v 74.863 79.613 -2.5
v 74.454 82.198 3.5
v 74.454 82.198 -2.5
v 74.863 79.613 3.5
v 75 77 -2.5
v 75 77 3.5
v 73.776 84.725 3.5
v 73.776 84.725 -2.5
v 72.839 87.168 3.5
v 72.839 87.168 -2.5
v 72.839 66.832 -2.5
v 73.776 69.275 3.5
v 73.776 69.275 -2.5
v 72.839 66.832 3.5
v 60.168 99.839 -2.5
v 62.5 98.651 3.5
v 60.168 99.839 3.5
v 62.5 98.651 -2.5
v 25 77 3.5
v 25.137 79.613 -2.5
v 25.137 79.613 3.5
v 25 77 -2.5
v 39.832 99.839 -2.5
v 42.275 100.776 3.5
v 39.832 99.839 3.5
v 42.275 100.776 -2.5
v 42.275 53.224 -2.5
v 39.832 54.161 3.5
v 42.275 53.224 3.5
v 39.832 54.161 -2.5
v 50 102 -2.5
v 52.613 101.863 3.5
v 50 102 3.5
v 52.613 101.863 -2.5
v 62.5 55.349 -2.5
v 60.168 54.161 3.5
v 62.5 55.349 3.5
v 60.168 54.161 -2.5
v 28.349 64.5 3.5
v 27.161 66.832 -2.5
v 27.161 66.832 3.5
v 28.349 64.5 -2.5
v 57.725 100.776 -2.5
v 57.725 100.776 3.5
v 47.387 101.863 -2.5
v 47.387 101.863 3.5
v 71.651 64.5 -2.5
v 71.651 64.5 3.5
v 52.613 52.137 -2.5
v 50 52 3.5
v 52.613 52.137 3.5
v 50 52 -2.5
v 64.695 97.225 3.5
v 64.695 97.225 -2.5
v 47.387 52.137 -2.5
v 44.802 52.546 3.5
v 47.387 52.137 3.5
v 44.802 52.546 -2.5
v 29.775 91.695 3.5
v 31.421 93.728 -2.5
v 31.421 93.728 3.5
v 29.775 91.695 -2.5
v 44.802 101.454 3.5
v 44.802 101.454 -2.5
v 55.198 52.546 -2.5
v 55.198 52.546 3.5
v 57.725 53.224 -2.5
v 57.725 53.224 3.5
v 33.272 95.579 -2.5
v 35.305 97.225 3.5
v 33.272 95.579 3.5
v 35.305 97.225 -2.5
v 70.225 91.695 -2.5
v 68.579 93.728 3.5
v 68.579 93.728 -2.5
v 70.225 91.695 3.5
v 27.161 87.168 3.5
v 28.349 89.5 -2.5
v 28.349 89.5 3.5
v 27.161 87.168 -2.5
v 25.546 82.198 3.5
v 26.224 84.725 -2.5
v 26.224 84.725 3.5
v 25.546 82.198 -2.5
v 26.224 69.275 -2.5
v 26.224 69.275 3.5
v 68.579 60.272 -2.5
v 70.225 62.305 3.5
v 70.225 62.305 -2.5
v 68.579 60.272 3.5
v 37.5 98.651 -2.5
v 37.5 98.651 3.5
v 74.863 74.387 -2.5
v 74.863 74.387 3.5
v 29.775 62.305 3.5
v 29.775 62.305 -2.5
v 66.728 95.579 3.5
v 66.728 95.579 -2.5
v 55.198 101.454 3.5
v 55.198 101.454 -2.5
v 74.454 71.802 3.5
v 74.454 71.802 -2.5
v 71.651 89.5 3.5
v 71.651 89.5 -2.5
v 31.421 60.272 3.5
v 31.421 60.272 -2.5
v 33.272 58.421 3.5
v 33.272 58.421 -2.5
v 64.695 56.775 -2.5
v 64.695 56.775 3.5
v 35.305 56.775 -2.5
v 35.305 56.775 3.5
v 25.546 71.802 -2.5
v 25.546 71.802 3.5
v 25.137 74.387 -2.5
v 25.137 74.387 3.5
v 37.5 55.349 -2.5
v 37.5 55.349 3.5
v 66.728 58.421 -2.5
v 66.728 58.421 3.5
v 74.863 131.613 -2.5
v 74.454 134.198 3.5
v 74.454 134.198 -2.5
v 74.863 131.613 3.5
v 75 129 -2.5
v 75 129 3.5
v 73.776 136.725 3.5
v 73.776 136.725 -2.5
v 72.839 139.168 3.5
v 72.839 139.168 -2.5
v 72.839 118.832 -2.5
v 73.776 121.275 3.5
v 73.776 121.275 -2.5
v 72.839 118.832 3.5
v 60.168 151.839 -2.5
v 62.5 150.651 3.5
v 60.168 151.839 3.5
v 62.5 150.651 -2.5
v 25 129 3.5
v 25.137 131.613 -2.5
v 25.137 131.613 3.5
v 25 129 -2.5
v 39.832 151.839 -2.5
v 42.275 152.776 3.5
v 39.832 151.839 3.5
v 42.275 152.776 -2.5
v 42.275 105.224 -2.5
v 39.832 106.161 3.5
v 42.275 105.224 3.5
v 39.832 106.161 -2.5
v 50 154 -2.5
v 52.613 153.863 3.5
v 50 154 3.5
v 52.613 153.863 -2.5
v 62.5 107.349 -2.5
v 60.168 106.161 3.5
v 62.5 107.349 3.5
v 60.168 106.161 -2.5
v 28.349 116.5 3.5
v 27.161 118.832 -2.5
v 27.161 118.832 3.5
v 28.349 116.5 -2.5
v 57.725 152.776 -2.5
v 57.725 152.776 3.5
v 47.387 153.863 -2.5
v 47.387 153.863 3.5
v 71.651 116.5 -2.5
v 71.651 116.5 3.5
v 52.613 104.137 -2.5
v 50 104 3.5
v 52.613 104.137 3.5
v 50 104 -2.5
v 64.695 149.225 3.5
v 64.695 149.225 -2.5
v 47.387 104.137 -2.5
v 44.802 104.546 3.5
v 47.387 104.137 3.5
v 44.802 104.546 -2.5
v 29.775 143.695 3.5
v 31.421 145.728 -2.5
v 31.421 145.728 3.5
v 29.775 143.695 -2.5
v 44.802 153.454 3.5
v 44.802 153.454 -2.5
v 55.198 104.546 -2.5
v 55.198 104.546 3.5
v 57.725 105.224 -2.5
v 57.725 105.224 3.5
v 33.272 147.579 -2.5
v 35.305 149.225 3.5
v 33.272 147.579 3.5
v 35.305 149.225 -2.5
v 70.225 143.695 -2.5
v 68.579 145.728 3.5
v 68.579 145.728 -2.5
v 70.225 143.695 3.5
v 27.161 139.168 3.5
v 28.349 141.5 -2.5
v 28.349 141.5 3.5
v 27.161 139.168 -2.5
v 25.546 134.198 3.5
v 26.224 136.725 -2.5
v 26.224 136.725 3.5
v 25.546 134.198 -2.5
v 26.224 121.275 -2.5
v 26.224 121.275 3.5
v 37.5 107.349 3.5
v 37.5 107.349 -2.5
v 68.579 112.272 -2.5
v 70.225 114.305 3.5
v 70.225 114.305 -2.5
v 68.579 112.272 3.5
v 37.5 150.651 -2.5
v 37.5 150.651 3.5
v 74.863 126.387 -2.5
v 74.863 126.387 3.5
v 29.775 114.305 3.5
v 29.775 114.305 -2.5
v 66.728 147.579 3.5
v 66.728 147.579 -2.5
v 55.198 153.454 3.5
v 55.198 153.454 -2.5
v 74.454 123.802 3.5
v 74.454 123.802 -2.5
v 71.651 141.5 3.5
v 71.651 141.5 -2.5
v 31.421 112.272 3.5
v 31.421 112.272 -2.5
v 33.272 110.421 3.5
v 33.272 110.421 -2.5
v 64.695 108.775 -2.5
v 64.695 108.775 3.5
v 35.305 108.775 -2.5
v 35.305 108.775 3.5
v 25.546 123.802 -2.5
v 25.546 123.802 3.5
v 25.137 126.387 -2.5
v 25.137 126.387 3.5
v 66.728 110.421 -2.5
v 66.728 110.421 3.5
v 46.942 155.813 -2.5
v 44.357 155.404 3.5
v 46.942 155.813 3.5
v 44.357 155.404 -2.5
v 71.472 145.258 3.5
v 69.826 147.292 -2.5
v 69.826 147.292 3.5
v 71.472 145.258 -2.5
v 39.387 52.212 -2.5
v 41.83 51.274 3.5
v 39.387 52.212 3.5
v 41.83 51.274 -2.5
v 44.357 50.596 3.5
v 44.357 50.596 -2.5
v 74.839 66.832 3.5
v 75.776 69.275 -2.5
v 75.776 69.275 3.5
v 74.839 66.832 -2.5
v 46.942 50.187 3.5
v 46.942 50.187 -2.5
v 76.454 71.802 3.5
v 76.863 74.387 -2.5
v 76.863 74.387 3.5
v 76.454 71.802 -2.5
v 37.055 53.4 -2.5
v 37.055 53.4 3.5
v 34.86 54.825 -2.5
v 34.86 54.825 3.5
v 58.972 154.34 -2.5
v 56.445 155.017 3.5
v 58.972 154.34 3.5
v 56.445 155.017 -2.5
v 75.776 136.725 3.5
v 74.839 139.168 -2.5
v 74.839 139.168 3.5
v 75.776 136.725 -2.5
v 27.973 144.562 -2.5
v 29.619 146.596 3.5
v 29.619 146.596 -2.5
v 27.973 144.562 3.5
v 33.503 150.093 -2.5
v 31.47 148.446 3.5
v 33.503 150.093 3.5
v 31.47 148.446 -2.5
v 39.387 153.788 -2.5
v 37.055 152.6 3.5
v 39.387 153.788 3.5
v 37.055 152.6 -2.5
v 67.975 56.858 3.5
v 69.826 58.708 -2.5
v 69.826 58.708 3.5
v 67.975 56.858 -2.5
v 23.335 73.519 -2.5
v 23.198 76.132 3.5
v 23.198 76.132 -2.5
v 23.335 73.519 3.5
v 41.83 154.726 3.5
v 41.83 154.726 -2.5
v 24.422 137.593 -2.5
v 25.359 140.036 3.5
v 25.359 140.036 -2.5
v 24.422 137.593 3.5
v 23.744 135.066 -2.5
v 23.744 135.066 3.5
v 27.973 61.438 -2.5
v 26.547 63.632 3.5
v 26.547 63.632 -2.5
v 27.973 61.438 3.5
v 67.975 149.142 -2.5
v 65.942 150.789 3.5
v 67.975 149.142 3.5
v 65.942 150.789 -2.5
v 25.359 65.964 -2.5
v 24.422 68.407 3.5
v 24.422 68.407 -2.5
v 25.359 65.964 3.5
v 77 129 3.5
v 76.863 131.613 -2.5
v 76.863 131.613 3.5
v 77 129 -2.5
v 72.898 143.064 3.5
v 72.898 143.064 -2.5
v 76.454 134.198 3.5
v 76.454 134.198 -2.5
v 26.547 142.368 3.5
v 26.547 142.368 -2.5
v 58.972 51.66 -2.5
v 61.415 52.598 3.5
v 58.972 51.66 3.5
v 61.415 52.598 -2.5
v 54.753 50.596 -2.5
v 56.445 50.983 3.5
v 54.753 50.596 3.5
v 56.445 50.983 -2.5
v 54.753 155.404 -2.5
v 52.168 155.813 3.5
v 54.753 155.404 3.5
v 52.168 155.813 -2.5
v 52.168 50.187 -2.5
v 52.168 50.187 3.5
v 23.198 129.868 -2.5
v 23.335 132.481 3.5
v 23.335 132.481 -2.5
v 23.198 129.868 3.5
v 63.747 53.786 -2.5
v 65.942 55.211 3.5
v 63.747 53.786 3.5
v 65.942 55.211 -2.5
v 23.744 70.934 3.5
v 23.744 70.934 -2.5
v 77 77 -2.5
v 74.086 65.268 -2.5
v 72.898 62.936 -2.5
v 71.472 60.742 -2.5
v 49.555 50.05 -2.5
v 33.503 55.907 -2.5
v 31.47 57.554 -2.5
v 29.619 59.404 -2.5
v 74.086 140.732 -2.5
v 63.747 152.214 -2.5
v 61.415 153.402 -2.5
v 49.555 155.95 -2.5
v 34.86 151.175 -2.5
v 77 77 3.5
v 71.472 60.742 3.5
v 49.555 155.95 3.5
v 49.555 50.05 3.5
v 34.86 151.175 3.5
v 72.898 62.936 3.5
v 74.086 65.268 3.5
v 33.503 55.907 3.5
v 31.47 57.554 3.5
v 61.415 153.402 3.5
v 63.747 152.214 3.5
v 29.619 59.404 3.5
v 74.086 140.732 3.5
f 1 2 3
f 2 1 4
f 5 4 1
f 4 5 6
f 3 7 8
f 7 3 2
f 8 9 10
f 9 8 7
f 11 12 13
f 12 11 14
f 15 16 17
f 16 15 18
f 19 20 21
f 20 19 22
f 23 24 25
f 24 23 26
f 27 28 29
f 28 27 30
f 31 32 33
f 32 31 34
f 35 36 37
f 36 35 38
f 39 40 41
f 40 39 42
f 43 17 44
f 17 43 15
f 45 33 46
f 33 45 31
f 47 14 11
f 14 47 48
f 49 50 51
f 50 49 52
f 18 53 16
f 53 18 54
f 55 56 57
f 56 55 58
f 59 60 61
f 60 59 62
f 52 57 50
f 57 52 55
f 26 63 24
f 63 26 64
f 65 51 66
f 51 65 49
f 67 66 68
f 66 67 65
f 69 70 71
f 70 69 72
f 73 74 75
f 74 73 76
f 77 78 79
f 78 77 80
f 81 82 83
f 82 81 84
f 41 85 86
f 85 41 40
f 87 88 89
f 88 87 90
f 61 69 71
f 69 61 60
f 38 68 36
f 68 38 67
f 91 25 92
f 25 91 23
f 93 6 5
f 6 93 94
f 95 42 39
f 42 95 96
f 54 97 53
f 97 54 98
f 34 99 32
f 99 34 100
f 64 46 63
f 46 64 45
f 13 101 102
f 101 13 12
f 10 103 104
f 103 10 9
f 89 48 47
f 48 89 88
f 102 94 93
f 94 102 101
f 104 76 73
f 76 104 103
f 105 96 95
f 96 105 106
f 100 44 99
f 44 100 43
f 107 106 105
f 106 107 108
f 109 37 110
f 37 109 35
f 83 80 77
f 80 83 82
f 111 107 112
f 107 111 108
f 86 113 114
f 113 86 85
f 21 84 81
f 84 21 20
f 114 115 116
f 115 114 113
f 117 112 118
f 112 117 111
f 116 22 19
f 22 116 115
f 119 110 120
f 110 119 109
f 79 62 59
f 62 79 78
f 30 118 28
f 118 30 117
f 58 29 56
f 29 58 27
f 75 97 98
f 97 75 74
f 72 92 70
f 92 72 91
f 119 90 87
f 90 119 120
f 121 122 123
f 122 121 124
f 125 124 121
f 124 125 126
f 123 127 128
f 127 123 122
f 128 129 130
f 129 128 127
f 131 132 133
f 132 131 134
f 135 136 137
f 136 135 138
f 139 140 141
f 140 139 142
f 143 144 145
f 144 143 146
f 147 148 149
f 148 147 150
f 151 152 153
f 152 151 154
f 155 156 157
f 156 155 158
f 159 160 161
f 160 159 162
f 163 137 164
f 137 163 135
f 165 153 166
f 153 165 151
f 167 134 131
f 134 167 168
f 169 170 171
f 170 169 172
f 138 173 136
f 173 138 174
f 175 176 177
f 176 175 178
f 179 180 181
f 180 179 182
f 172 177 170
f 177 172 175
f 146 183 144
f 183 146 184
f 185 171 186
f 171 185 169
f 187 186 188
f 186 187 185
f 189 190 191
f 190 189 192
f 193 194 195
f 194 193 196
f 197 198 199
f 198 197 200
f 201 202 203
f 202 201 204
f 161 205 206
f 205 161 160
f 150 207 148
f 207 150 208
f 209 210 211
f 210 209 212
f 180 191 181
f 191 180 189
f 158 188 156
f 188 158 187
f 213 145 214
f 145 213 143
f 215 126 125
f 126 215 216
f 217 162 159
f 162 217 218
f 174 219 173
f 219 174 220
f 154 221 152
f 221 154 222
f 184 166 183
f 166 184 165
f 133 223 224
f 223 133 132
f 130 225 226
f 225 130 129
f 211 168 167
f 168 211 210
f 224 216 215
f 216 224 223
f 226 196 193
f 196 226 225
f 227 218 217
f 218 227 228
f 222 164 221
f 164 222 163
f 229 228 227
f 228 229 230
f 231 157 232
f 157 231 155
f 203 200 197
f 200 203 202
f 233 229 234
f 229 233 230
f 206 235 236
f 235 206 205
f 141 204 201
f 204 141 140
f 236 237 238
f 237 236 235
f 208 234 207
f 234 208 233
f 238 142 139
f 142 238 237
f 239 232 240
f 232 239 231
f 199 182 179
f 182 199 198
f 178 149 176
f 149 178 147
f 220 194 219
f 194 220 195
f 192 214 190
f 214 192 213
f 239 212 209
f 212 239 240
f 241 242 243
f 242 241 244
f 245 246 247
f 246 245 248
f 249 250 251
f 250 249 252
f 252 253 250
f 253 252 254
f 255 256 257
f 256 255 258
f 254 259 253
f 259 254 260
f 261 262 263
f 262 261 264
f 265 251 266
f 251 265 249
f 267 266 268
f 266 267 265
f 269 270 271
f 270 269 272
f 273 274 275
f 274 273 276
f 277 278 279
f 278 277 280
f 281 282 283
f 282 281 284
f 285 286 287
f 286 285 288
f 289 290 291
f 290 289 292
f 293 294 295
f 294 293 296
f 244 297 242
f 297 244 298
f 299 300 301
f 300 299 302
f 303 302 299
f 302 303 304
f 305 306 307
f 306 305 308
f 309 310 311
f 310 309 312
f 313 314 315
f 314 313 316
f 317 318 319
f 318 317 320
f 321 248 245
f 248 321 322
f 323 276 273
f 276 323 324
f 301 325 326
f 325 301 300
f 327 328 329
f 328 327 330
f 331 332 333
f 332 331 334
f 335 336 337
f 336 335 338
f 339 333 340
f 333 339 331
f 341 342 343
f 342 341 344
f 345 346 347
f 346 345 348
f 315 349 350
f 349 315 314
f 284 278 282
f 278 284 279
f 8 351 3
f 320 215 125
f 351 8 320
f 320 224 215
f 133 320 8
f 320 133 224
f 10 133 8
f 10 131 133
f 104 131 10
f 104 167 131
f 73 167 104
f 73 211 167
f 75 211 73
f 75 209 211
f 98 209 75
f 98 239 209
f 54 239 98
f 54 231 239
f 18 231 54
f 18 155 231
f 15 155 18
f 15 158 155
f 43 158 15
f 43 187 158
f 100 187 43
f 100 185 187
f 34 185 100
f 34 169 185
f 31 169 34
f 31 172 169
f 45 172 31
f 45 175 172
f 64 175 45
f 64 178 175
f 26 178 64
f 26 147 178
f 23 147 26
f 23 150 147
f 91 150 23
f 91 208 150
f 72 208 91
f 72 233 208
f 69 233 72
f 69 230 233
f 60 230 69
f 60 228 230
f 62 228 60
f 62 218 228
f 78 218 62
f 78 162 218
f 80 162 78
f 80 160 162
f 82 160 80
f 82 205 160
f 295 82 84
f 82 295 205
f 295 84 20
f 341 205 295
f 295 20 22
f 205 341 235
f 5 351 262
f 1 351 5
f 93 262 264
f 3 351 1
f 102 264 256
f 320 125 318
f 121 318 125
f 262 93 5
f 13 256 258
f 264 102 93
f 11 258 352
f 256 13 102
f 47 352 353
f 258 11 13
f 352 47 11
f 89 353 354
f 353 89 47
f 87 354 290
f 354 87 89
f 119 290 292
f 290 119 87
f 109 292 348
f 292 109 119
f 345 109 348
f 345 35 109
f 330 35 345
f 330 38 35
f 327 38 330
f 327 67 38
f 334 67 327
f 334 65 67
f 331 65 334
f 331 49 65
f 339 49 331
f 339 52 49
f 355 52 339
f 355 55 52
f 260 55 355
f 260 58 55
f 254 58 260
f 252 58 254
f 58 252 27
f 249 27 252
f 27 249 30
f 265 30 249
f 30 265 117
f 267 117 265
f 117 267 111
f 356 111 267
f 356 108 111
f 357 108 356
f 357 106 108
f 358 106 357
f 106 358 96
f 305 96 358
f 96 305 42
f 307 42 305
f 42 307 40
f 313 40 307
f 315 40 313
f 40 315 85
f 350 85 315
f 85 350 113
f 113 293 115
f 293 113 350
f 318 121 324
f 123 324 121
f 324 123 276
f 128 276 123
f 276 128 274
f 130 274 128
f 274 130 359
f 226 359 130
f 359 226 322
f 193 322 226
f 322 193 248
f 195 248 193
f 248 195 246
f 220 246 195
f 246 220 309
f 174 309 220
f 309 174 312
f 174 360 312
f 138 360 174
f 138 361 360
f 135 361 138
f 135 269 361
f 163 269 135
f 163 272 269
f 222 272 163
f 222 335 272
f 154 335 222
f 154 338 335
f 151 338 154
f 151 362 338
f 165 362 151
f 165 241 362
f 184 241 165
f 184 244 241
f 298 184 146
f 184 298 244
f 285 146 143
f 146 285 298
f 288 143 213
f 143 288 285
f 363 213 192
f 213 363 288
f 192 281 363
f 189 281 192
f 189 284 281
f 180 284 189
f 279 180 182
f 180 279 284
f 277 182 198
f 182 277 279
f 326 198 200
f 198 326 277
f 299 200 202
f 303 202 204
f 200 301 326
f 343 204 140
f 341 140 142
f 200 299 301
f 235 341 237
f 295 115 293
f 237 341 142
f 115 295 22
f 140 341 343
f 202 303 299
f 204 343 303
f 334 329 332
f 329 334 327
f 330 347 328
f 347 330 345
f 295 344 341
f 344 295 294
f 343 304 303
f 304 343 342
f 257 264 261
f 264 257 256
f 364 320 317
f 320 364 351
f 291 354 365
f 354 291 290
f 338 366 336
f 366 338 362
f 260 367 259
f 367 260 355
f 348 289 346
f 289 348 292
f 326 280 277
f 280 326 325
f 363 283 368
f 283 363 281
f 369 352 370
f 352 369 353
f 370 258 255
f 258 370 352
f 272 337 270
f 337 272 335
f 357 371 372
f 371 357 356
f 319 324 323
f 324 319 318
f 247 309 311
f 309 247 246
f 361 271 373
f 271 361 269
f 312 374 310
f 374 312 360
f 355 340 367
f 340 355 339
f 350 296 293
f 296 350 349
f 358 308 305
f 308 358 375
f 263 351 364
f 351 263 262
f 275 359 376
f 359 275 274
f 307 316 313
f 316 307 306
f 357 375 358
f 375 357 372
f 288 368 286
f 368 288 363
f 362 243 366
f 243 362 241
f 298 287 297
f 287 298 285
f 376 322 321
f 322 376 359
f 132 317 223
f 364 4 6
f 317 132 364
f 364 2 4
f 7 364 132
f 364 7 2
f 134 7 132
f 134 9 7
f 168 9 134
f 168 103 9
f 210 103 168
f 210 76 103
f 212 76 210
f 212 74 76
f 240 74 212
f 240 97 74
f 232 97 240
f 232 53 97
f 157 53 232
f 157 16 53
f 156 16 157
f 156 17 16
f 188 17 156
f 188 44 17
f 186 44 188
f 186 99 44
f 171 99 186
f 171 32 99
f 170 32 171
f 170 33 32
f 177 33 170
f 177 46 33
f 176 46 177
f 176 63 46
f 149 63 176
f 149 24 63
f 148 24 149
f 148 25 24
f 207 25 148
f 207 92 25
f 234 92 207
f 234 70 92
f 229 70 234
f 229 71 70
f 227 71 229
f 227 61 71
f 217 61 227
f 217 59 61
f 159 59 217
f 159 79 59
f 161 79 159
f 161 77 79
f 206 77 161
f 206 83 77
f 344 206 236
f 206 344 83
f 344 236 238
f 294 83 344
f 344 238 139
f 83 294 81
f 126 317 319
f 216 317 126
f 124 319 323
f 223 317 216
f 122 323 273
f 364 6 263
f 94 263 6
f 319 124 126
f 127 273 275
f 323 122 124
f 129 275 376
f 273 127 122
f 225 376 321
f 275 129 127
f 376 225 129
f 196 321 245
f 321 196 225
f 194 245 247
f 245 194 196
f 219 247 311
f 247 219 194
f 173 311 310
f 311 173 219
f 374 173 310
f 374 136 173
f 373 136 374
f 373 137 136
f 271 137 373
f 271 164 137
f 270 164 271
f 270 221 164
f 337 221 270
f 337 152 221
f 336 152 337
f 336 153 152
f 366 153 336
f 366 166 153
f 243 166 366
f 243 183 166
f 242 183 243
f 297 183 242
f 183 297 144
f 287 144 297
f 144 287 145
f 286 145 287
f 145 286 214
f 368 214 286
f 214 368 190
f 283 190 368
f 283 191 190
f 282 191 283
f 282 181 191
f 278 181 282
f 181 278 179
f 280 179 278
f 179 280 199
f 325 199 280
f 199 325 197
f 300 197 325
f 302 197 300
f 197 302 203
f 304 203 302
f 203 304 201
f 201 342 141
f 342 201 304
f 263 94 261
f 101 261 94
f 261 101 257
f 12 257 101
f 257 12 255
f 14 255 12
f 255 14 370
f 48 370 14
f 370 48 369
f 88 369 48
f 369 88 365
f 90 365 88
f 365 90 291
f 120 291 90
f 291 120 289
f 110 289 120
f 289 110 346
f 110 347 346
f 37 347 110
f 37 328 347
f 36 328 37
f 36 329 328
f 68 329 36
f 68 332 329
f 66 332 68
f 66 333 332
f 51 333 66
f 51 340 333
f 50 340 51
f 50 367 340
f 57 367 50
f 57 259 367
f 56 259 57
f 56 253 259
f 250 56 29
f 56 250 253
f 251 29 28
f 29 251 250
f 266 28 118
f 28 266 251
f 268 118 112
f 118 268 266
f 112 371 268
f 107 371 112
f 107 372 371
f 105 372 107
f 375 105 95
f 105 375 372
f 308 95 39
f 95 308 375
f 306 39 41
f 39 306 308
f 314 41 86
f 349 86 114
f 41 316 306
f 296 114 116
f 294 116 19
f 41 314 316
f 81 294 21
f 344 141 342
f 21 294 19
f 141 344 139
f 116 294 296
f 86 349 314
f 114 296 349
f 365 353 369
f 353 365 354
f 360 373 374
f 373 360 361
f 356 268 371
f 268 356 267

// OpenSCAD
// [FL_INDEX: keywords="openscad, 3d_parametric, Parametric_Hole_Mold, csg_solid" | COT="Parametric OpenSCAD design from 3DCodeverse"]
// Title: Parametric Hole Mold

/*
 * Parametric Hole Mold
 *
 * By: Mike Creuzer <thingiverse@creuzer.com>
 * 
 * http://www.thingiverse.com/thing:22006
 *
 * Version 1.0
 */


// everything is in mm so if you want to use inches, use the following conversion
//inchestomm = 25.4 ;

height    = 5;
// Remember the diameter is twice the radius (full circle size)
diameter = 25; // Remember the diameter is twice the radius (full circle size)

rows   = 1; // Number of rows to have
cols    = 2; // Number of cols to have



difference() {
	shell();
	holes(2); // make 'em taller so we cut right through, otherwise we end up with a thin shell
}



// make the frame of the mould
module shell()
{
	minkowski()
	{
		hull() {	
			holes();	
		}
		cylinder(r=2);
	}
}


// calculate the series of holes needed to make the mold
module holes( multiplier = 1 )
{
for ( i = [1 : rows] )
{
	
	for ( j = [1 : cols] )
	{
		if(i % 2 == 1)
		{
			translate([(2 * diameter + 1) * i -  i   , ((2 * diameter + 2) * j) + diameter, 0])
				cylinder(r =diameter, h = height * multiplier, $fa=6, center = true);
		
		}else
		{
			translate([(2 * diameter + 1) * i - i  , (2 * diameter + 2) * j , 0])
				cylinder(r =diameter, h = height * multiplier, $fa=6, center = true);
		
		
		}
	}
}

}
